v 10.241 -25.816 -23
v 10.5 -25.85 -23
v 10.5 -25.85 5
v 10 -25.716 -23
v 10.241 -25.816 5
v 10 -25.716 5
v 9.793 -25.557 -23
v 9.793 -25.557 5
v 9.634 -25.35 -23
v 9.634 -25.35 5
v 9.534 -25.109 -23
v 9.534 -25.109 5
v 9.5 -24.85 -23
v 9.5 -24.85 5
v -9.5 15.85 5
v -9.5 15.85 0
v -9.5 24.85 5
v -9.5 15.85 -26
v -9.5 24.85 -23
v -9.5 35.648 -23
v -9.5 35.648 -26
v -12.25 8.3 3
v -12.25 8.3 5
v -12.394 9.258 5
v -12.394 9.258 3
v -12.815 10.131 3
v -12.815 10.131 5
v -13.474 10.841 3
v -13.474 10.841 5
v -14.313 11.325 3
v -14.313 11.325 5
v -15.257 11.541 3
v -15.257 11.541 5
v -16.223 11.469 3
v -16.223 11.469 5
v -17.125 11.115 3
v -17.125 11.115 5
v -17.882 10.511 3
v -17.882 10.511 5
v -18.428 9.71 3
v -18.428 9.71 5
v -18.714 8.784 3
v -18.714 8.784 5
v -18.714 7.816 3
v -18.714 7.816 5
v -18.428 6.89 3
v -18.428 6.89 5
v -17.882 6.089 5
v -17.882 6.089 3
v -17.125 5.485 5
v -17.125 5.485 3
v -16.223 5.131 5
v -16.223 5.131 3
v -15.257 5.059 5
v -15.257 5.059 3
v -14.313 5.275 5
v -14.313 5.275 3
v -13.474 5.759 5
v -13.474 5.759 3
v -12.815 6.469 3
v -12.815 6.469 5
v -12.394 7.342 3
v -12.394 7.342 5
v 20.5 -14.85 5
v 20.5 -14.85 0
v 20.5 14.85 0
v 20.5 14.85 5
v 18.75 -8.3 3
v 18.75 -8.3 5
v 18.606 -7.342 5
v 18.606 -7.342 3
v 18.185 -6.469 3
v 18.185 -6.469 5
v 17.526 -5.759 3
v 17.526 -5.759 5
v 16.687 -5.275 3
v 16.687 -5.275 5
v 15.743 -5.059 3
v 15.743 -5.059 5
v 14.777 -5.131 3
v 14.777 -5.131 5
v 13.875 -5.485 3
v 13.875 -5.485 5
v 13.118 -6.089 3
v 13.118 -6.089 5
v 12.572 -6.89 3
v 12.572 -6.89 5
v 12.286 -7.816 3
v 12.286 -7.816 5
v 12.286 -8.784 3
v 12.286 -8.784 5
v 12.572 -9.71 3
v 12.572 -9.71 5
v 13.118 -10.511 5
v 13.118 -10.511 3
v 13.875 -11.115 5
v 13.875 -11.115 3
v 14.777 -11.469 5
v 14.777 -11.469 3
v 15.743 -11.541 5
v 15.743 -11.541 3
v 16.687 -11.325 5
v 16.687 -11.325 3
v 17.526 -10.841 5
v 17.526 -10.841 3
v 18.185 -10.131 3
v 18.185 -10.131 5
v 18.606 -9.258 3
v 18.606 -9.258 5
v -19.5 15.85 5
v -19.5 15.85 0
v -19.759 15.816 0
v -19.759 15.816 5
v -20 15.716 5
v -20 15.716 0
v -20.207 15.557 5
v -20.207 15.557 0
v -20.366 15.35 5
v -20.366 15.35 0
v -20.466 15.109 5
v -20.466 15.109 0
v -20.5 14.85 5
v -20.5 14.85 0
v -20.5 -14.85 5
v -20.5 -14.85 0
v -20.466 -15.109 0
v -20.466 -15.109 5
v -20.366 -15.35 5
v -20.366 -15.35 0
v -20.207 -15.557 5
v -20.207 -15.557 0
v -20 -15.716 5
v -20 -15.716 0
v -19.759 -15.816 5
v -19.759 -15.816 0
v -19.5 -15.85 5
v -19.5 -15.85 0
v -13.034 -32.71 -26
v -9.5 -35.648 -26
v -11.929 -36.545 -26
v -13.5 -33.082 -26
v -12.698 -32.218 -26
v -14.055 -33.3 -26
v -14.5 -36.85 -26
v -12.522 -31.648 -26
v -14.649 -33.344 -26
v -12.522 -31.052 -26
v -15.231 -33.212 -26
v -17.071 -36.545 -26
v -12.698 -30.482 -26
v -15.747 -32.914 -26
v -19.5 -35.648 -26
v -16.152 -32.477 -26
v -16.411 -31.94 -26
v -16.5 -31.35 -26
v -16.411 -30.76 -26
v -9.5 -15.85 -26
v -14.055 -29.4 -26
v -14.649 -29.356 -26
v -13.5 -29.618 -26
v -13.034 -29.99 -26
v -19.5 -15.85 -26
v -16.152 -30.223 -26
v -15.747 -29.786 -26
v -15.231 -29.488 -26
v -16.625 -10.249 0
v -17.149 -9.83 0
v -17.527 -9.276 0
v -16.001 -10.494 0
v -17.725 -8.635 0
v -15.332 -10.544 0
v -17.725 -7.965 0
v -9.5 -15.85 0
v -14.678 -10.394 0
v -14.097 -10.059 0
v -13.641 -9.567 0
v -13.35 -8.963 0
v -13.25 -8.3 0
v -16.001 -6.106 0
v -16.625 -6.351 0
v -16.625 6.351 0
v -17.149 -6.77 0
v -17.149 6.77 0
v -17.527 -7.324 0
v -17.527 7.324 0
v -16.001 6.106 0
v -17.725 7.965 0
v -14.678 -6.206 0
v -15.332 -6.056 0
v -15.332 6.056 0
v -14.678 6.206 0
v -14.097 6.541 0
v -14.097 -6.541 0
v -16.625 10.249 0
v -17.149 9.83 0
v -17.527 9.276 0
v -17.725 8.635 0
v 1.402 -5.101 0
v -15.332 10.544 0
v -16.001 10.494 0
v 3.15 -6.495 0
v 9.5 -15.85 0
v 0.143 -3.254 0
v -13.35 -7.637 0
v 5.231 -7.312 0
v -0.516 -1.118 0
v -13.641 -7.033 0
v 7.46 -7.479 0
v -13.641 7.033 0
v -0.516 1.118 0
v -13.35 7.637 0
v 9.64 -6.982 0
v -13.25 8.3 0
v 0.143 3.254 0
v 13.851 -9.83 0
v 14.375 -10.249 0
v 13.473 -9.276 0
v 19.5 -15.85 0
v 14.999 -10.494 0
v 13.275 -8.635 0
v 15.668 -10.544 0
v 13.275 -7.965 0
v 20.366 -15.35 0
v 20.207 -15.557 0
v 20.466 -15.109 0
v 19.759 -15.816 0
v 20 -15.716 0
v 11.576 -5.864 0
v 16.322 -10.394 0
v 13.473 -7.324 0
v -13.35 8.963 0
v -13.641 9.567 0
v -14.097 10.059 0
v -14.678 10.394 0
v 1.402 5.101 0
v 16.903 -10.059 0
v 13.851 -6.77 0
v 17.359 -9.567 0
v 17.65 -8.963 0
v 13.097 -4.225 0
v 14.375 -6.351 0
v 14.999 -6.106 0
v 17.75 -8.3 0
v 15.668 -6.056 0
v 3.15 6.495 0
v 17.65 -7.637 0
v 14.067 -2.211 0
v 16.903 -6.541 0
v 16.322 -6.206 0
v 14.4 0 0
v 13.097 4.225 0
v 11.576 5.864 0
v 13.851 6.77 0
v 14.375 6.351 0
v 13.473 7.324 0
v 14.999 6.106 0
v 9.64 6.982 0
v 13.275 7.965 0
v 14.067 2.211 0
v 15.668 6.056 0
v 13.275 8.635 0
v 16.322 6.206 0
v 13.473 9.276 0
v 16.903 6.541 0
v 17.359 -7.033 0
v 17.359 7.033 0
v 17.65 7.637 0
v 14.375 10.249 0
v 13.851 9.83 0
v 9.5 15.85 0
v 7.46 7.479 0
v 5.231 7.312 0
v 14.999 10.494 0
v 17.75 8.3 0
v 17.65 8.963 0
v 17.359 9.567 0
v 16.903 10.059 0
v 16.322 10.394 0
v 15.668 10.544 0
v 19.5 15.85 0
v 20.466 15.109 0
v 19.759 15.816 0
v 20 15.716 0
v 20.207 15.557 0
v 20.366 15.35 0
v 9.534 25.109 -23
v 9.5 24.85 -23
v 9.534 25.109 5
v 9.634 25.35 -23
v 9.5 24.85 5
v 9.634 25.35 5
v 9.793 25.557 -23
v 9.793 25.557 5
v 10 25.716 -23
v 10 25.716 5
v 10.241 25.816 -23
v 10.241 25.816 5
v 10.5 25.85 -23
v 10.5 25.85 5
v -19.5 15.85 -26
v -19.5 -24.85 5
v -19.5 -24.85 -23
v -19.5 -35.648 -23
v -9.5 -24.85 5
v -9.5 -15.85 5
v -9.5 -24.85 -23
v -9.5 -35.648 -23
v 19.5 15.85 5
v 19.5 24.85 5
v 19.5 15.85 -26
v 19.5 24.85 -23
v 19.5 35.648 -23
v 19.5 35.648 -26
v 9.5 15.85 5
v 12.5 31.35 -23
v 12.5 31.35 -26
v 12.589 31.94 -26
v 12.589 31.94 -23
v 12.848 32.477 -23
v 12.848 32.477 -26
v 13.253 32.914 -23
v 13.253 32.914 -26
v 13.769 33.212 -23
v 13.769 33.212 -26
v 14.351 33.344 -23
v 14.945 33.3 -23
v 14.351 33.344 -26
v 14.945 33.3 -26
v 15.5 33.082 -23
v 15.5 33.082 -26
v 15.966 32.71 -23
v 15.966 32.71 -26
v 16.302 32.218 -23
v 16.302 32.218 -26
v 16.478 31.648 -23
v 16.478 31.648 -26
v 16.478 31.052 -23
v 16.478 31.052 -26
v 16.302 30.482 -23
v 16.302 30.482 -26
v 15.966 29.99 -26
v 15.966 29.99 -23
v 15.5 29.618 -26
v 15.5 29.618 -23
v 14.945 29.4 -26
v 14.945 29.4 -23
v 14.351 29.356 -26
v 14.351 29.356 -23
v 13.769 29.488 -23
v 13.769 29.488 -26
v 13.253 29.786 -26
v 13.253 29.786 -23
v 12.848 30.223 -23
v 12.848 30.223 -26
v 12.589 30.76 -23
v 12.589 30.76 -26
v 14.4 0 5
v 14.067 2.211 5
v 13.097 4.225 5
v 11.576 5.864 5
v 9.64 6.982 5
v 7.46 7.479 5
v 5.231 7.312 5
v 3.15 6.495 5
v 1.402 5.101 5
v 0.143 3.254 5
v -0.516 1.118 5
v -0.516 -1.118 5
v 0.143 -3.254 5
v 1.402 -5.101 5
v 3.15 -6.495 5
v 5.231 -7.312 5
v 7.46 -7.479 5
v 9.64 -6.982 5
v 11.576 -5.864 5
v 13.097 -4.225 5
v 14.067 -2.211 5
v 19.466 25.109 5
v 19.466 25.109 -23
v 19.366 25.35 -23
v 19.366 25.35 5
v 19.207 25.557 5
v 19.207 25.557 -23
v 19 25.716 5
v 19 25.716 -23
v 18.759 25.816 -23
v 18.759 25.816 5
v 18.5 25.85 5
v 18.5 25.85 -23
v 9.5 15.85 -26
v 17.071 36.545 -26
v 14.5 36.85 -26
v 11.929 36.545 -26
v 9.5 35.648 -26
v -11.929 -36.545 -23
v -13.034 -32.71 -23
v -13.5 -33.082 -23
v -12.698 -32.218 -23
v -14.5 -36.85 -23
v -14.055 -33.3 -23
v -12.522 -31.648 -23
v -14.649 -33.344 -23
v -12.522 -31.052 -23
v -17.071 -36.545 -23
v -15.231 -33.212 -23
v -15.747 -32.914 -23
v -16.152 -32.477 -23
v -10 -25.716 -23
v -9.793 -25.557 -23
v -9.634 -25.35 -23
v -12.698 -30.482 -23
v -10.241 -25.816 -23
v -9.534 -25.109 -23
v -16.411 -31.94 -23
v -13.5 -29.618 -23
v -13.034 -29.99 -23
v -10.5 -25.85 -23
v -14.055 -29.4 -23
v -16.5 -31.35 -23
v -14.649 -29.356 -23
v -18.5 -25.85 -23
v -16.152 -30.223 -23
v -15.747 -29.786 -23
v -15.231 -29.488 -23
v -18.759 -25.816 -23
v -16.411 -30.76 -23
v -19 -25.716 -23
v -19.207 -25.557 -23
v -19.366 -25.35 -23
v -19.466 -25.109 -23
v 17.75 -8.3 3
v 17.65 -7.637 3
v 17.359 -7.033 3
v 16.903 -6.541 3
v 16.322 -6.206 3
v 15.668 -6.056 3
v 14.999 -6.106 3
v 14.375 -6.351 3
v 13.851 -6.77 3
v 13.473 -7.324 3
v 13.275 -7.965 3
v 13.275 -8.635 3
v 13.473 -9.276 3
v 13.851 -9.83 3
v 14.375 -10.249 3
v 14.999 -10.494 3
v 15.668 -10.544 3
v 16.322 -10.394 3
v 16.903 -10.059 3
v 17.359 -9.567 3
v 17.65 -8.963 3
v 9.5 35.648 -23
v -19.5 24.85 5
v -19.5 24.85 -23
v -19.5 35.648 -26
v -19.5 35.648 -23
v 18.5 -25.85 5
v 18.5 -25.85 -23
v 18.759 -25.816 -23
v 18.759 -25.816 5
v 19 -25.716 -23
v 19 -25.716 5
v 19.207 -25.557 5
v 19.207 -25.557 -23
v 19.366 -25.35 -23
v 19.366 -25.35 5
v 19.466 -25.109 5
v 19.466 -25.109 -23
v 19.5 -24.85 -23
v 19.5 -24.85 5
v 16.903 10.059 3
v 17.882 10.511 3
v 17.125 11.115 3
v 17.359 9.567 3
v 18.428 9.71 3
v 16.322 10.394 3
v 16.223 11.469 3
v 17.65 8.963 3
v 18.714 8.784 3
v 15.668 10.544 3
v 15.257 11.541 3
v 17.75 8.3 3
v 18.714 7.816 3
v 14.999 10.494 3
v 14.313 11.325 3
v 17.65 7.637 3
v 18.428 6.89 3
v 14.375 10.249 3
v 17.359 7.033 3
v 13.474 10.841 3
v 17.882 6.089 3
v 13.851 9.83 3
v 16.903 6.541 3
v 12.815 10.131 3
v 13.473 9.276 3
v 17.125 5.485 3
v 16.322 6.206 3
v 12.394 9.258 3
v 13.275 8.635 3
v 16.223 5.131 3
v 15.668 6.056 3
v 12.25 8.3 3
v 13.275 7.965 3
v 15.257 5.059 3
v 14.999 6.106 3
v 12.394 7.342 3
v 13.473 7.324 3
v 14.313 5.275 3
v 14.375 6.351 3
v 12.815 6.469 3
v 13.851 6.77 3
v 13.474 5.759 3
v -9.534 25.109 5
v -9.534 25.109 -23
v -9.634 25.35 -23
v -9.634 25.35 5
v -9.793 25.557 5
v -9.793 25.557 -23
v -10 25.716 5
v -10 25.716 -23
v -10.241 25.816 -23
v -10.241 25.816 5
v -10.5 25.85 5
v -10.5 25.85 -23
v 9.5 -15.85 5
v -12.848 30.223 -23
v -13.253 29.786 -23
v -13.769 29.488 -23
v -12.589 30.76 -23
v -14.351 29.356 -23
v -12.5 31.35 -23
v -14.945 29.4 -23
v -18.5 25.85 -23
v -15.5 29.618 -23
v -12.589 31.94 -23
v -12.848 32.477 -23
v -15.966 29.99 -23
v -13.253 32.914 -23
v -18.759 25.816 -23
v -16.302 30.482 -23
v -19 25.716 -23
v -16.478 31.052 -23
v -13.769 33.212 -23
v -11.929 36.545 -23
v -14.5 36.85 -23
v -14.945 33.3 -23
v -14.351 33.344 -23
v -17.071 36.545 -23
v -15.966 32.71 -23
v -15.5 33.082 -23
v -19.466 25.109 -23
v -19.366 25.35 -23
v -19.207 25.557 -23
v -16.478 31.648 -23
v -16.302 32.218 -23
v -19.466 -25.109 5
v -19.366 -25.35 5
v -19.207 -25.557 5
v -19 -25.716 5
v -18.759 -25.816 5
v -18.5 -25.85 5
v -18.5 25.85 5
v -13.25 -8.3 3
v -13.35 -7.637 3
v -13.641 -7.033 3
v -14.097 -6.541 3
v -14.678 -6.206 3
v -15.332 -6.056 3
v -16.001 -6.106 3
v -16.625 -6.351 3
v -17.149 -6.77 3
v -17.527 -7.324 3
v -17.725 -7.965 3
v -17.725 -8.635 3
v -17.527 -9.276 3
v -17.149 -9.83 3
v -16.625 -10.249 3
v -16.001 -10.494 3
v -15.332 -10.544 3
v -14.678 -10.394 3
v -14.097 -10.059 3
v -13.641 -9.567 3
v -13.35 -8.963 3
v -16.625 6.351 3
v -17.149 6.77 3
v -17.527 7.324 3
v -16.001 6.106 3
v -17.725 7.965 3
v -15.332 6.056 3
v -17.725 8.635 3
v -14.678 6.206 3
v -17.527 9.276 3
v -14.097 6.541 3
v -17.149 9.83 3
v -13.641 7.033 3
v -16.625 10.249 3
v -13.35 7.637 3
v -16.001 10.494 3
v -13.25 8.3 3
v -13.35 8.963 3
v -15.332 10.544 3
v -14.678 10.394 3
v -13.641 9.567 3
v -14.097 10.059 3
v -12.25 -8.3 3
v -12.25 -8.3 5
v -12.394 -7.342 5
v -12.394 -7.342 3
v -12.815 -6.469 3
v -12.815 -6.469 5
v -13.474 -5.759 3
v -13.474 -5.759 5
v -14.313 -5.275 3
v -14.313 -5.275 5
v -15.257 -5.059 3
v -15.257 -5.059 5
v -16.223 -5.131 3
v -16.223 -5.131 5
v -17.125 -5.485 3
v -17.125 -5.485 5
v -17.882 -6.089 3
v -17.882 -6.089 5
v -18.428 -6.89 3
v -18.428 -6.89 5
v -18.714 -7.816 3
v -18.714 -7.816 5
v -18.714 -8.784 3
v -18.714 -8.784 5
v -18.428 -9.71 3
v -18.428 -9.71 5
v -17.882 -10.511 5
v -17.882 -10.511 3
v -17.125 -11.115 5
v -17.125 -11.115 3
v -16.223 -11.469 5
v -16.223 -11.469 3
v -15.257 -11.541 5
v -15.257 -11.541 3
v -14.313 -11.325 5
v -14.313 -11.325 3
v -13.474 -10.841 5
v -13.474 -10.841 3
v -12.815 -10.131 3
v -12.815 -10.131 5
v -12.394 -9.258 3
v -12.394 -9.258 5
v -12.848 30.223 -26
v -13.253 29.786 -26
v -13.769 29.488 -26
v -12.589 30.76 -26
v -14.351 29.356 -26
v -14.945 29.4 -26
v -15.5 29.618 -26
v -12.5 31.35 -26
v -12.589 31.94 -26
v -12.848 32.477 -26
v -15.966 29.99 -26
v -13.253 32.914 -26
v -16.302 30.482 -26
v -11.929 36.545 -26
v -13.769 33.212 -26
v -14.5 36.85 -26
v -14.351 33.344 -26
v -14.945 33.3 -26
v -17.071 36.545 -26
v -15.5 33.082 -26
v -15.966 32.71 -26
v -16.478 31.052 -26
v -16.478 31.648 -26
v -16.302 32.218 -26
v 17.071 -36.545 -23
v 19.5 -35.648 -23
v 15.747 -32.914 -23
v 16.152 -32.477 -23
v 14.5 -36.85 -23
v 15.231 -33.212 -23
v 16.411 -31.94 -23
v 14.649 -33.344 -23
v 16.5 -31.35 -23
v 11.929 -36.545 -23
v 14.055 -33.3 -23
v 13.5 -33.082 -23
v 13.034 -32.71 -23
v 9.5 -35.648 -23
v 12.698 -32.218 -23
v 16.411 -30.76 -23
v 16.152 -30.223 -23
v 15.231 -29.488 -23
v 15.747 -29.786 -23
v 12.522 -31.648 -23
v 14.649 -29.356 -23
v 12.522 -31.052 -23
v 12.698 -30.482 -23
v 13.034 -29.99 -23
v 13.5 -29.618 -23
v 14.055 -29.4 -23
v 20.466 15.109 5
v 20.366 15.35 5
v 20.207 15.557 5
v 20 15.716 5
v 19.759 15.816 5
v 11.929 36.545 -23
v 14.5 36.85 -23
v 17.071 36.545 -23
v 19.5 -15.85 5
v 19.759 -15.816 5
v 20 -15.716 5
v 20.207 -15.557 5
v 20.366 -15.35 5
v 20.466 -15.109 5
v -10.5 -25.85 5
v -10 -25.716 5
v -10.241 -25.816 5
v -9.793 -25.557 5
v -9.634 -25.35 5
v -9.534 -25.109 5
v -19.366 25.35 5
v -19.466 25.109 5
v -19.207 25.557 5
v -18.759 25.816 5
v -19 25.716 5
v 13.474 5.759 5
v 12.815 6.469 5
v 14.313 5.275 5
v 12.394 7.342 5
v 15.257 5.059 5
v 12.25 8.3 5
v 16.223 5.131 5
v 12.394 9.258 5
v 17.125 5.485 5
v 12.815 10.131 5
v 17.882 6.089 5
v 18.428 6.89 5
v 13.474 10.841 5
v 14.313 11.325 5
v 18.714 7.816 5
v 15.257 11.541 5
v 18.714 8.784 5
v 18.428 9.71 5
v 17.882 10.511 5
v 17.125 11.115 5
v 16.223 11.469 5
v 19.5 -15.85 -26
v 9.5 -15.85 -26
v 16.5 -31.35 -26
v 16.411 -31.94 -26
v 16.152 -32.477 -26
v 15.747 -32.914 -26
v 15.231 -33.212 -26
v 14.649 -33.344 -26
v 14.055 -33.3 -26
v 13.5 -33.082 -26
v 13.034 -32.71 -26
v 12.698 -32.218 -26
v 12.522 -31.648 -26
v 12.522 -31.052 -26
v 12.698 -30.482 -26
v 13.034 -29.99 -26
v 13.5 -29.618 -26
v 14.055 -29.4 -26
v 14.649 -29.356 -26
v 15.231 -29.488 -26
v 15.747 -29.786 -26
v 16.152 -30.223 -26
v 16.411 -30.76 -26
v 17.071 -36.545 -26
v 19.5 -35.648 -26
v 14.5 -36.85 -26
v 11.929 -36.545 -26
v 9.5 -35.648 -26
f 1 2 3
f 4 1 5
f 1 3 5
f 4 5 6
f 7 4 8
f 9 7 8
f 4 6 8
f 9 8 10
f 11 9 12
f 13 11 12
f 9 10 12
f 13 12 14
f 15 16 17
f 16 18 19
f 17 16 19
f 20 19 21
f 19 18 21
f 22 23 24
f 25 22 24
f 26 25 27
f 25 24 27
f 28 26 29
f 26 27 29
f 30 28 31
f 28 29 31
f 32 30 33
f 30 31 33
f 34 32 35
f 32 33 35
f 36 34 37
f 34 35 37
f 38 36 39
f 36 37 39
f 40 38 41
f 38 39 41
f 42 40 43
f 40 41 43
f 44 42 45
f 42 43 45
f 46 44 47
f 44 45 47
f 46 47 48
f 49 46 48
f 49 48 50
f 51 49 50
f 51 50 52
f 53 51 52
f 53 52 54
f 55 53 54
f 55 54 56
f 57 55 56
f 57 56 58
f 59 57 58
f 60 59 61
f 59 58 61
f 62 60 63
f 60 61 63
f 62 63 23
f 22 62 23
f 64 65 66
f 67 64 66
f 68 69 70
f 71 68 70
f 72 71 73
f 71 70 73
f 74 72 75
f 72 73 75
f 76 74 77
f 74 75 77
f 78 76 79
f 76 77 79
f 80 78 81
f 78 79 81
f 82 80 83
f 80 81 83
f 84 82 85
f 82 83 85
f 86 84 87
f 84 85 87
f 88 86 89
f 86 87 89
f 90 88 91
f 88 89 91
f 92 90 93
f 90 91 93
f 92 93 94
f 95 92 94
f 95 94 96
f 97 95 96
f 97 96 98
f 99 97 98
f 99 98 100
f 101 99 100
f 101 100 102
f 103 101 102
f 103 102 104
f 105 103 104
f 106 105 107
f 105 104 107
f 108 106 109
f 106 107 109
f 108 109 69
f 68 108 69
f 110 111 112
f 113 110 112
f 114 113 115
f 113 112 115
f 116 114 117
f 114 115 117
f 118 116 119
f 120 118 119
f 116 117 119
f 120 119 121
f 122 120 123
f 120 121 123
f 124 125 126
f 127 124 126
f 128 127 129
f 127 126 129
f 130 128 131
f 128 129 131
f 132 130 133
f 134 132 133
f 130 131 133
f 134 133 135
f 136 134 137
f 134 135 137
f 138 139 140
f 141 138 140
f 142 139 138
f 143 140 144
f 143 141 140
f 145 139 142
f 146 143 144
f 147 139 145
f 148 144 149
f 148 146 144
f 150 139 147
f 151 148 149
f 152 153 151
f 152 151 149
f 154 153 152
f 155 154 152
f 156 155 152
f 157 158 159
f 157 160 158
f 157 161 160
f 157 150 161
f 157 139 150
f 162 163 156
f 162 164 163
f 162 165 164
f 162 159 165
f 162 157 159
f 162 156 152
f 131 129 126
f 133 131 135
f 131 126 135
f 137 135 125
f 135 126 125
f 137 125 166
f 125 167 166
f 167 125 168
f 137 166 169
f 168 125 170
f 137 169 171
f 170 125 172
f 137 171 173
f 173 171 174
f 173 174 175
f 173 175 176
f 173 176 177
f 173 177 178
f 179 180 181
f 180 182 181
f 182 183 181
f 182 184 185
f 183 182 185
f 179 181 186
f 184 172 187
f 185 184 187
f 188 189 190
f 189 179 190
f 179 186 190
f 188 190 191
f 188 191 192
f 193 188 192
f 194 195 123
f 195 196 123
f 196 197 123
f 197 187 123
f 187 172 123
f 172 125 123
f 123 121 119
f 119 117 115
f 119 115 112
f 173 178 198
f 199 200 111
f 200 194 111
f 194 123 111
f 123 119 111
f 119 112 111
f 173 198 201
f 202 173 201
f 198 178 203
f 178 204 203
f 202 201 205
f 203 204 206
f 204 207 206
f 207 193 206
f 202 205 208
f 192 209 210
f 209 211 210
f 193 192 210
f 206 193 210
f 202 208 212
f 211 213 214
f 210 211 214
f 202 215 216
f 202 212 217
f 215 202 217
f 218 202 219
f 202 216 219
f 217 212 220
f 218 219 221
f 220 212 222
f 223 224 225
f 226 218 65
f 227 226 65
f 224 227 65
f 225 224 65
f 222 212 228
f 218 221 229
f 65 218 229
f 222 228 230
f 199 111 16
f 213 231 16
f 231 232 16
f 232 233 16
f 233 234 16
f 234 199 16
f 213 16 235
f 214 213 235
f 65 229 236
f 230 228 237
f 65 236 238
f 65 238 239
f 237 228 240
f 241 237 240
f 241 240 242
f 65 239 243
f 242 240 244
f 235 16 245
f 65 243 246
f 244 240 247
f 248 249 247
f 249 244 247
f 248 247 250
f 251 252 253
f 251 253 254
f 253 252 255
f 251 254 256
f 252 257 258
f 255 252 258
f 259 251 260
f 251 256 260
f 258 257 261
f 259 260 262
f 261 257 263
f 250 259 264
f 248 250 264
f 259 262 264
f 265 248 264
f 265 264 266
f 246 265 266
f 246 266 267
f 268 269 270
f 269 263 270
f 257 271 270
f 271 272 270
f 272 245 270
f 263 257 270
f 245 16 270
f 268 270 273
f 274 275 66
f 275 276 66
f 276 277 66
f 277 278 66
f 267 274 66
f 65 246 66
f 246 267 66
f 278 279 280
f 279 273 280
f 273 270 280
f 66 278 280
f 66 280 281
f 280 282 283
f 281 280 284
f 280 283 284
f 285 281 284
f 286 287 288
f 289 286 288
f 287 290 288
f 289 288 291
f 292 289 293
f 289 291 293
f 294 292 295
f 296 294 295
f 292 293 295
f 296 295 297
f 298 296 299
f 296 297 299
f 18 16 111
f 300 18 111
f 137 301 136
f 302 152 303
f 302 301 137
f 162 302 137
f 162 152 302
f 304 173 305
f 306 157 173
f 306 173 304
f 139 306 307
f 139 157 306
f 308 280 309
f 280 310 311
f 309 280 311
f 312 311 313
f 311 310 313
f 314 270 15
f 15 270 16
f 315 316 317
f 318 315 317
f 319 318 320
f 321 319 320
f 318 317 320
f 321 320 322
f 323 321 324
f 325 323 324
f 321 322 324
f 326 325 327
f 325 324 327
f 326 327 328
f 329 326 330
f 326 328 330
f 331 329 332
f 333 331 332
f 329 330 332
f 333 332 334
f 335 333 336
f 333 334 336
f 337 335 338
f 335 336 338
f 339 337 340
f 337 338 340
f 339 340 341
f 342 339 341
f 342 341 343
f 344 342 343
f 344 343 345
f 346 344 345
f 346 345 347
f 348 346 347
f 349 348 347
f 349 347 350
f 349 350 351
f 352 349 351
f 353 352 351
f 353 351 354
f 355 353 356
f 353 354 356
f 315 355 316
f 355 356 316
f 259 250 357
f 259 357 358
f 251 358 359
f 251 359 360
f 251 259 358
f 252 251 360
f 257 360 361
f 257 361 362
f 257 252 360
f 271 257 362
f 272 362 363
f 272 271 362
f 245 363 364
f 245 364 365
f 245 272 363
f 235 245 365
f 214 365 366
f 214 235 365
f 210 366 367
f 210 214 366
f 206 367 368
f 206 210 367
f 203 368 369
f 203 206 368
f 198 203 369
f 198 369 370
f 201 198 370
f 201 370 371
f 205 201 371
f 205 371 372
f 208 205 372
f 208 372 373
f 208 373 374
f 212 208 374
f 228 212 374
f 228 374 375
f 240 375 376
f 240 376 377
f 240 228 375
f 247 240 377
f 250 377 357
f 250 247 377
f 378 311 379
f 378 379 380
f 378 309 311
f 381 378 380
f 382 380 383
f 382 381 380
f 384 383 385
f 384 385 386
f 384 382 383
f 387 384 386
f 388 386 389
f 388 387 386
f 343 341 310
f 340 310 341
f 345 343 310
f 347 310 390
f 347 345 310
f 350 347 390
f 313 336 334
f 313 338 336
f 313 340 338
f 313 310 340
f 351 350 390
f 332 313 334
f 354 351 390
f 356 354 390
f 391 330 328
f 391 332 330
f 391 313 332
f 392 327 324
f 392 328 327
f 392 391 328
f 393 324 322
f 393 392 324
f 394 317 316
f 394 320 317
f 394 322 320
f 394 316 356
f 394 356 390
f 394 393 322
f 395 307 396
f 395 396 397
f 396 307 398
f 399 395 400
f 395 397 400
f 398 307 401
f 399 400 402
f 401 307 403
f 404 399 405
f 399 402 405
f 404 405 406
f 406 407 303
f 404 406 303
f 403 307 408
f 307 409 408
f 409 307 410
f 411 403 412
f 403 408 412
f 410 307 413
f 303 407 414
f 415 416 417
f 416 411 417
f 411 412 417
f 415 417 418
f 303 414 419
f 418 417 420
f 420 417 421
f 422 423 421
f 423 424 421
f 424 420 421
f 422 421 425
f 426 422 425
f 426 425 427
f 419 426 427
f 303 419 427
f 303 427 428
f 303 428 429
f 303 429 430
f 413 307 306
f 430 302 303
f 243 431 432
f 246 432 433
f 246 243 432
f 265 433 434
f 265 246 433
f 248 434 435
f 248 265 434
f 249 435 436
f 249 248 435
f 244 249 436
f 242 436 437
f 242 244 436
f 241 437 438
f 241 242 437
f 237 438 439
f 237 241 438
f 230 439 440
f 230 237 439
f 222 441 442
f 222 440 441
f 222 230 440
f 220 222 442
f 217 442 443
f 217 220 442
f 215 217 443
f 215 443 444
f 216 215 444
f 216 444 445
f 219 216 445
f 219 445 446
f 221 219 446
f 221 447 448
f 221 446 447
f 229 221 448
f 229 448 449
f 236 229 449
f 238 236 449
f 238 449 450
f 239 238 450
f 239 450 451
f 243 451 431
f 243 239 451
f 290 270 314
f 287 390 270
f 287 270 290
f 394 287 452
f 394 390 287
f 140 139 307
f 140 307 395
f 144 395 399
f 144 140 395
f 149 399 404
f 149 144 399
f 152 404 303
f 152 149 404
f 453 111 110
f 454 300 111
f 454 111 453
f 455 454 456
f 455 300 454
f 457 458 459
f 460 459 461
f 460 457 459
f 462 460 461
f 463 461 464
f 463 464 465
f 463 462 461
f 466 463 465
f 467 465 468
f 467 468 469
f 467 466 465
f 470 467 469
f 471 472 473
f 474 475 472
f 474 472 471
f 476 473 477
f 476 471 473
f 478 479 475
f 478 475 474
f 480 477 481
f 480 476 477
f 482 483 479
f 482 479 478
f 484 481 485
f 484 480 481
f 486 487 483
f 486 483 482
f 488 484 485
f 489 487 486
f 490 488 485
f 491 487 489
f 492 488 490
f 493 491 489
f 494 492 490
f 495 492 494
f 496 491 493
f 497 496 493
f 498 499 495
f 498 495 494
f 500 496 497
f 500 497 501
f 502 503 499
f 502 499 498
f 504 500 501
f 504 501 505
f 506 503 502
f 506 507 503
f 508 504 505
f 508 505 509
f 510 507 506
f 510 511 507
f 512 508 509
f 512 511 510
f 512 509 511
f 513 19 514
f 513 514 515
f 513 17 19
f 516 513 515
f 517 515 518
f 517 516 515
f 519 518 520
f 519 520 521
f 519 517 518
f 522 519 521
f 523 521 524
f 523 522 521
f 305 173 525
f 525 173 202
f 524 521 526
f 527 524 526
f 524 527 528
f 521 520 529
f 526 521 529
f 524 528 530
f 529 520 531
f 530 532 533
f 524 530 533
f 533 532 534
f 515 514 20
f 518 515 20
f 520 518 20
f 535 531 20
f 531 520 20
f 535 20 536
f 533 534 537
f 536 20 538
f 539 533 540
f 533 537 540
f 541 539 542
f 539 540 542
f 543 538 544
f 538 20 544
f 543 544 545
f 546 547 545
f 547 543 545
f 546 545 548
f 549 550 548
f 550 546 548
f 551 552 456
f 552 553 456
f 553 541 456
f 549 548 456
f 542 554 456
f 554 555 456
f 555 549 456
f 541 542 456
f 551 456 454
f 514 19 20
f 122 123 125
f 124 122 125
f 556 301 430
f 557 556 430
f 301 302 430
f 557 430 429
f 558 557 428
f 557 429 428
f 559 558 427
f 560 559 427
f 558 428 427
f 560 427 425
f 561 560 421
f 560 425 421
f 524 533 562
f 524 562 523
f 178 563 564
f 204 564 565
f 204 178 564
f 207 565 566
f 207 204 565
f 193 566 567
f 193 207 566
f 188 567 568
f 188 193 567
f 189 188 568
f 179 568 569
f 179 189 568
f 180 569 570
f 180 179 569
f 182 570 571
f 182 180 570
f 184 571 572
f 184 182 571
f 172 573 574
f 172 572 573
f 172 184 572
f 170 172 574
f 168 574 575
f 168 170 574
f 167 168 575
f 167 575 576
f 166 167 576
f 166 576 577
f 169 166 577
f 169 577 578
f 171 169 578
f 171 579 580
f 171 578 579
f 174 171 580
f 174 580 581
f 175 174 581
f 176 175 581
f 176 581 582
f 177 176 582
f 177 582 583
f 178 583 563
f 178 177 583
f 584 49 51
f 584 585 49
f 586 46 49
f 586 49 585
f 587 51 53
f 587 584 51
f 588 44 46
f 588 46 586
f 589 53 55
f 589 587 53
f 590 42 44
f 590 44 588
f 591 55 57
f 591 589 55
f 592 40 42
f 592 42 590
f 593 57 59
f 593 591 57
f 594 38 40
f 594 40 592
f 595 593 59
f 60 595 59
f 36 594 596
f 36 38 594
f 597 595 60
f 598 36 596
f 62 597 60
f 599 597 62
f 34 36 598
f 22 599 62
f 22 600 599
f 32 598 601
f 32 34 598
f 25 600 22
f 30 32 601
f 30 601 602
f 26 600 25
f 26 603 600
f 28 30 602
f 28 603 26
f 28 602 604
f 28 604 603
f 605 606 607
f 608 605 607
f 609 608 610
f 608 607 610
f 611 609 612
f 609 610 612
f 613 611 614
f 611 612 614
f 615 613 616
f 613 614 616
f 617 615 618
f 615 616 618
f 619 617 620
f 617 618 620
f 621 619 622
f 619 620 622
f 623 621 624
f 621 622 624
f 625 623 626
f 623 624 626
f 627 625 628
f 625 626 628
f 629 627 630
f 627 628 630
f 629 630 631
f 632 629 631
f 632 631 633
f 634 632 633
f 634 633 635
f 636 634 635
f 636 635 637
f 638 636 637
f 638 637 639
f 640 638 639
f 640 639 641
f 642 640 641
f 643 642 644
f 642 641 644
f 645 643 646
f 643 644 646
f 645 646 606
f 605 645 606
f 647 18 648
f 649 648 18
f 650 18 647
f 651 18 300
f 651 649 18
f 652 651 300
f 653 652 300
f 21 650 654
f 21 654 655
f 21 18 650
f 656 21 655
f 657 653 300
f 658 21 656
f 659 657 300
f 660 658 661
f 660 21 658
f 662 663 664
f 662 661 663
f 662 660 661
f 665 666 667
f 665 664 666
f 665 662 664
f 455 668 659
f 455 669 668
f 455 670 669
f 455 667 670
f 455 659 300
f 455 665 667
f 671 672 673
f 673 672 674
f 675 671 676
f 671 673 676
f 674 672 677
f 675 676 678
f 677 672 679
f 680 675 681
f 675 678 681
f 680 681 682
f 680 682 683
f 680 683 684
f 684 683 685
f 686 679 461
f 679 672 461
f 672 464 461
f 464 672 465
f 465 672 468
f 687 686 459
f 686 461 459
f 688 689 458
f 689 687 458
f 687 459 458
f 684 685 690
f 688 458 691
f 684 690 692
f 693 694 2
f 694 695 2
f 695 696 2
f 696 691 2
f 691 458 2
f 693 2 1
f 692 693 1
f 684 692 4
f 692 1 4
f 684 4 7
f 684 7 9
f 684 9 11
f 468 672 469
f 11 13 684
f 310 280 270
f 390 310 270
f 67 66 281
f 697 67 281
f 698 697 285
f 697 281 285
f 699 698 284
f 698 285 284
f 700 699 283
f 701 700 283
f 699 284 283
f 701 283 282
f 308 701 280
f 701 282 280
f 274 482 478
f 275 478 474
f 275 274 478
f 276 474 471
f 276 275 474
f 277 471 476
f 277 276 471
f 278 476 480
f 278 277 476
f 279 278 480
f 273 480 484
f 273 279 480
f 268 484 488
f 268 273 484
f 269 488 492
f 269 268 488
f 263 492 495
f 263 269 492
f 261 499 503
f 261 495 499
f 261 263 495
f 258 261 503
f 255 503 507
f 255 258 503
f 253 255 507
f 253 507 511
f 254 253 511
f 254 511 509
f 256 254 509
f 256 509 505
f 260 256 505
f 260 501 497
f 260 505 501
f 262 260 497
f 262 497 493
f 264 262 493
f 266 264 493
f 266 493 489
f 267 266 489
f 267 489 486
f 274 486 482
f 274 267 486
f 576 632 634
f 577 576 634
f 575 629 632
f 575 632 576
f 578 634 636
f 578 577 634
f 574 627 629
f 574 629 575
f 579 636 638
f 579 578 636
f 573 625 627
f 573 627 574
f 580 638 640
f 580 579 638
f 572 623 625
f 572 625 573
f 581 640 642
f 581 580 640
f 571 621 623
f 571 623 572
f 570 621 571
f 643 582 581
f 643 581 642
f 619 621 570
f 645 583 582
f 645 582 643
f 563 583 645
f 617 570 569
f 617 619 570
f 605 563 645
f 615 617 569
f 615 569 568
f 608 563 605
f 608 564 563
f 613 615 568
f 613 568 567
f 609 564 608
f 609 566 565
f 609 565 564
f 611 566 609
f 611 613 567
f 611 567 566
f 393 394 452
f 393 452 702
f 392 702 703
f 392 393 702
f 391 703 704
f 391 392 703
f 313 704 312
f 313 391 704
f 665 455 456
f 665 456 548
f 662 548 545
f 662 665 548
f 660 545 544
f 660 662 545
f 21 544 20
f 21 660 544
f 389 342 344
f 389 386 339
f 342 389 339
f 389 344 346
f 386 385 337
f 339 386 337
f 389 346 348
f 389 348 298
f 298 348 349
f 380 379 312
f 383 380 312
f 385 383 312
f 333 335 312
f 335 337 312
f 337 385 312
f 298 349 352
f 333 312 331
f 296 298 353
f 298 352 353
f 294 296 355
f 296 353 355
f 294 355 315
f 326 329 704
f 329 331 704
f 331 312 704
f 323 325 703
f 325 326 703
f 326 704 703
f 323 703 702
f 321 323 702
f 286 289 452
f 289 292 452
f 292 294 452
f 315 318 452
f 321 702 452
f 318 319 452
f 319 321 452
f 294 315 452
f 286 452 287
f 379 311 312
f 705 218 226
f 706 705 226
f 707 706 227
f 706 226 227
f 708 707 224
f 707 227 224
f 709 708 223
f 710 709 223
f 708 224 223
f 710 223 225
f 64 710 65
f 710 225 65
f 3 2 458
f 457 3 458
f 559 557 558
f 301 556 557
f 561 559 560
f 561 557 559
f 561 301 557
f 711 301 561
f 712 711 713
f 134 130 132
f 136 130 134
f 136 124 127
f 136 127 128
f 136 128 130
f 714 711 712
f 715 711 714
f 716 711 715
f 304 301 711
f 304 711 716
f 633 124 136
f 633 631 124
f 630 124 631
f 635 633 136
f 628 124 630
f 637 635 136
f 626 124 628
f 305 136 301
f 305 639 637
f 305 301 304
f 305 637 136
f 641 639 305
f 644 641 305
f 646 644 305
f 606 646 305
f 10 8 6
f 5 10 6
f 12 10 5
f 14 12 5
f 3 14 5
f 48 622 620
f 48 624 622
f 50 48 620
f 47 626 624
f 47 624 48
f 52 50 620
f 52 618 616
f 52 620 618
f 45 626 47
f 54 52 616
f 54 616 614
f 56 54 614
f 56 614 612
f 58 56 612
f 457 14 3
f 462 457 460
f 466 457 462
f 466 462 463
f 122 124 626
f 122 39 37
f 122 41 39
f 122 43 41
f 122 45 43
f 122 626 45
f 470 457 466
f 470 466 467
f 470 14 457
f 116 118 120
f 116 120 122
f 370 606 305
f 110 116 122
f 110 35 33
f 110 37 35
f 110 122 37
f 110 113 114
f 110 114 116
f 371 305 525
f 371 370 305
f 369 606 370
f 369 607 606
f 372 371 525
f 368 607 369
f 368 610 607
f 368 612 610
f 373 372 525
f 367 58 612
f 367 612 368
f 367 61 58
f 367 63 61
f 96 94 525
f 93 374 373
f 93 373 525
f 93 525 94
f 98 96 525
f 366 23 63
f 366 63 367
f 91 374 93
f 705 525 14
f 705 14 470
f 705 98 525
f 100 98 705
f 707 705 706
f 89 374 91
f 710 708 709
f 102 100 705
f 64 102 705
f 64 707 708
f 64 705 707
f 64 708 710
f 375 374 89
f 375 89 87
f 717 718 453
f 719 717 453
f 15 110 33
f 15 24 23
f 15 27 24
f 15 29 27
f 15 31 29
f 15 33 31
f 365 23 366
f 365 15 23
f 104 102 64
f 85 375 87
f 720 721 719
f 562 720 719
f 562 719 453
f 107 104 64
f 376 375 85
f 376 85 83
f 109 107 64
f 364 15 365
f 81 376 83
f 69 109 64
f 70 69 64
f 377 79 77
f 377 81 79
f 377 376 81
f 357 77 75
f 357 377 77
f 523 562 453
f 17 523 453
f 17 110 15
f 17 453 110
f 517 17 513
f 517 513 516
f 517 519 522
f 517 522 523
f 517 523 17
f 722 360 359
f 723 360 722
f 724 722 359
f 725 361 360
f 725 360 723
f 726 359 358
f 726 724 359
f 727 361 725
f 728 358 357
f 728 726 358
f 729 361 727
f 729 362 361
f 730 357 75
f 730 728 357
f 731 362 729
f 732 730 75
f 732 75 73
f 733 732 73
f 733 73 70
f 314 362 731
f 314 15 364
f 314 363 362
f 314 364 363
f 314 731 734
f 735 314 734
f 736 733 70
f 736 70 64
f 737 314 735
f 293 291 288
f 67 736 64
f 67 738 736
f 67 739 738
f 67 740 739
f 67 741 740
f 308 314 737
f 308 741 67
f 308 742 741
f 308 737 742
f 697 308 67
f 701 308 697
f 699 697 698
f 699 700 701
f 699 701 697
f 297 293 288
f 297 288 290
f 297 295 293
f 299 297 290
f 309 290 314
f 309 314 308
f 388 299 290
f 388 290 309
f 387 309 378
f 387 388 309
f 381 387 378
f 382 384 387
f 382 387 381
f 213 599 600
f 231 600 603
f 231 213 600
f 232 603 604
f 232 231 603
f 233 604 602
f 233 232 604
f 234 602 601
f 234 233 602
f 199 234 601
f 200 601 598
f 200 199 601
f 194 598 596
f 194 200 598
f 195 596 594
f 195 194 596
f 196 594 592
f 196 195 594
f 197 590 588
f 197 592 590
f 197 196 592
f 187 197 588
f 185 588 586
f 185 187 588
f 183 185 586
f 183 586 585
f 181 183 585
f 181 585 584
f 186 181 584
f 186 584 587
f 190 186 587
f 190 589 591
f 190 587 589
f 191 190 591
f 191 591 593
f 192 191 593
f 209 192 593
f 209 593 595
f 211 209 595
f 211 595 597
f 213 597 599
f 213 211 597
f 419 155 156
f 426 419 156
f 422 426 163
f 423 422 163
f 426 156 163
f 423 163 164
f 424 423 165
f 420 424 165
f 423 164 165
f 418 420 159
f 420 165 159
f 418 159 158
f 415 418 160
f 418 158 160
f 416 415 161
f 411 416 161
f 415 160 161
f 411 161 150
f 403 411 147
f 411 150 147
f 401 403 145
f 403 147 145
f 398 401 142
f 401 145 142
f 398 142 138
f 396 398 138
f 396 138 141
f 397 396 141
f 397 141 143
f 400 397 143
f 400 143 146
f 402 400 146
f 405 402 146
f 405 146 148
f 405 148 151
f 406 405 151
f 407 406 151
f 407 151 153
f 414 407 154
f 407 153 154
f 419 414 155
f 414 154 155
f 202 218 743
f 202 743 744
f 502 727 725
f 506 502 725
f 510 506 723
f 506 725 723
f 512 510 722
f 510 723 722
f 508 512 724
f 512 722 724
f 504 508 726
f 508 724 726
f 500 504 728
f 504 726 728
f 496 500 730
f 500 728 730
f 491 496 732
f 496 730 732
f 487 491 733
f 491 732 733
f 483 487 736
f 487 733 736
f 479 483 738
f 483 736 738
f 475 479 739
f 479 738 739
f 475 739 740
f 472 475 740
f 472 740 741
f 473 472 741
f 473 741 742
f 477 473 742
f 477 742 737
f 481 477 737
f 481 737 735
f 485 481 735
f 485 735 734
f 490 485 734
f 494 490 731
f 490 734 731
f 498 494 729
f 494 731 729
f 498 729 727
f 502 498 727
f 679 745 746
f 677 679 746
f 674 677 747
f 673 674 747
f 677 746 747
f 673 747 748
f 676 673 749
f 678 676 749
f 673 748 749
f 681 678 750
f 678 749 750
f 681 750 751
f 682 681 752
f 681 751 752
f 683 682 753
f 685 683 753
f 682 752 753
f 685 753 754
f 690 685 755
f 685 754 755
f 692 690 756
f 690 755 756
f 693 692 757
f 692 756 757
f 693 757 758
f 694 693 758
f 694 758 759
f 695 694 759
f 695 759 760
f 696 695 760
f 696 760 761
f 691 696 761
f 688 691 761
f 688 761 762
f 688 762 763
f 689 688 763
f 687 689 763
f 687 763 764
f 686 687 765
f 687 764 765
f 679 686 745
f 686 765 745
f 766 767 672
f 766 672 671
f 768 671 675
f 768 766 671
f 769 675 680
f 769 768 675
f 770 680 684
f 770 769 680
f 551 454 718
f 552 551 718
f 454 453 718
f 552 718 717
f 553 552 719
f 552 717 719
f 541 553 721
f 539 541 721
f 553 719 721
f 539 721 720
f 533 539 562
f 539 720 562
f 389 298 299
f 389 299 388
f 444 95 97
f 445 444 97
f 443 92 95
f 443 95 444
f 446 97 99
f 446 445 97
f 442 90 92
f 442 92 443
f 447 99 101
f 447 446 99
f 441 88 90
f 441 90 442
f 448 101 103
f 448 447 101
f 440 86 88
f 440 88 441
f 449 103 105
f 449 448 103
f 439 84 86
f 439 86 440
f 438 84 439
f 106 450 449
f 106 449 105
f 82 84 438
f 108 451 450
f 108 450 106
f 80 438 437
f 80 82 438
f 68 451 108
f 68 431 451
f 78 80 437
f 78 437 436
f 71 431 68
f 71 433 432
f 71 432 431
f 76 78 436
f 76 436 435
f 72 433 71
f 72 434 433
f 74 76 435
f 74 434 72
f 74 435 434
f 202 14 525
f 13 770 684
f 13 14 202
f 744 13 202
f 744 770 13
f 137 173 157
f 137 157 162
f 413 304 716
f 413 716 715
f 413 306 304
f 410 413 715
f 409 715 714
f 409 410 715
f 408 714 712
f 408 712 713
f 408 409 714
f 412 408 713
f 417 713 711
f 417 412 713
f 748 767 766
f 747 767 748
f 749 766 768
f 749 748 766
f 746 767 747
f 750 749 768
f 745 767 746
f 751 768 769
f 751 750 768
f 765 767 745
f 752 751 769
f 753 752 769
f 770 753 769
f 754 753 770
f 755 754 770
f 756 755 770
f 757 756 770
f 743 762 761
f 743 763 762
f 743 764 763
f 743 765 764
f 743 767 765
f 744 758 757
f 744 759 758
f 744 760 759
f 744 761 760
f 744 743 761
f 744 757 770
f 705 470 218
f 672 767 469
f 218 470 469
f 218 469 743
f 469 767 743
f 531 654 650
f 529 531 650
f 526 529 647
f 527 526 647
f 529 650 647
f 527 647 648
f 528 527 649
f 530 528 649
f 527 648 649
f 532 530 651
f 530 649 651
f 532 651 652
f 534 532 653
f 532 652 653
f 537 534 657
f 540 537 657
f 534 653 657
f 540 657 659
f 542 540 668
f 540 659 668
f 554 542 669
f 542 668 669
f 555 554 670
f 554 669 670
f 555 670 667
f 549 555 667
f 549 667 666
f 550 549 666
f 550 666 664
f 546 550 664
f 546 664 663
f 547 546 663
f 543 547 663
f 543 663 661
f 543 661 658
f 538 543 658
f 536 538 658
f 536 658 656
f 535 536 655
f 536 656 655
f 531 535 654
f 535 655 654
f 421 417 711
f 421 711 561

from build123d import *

# Parameters (mm, degrees)
SKETCH1_W           = 10
SKETCH1_H           = 10
SKETCH1_R           = 7.5
SKETCH1_R_2         = 2.25
BOSS_EXTRUDE1_DEPTH = 5
SKETCH2_W           = 10
SKETCH2_H           = 10
BOSS_EXTRUDE2_DEPTH = 26
SKETCH4_R           = 2
BOSS_EXTRUDE3_DEPTH = 3
FILLET1_R           = 1
SKETCH5_R           = 3.25
CUT_EXTRUDE1_DEPTH  = 2


with BuildPart() as part:
    # Sketch1 → Boss-Extrude1 (new body)
    # profile 1 of 5: a face of its own
    with BuildSketch(Plane.XY):
        with Locations((-14.5, 20.85)):
            Rectangle(SKETCH1_W, SKETCH1_H)
    # profile 2 of 5: a face of its own
    with BuildSketch(Plane.XY):
        with Locations((14.5, 20.85)):
            Rectangle(SKETCH1_W, SKETCH1_H)
    # profile 3 of 5: a face of its own
    with BuildSketch(Plane.XY):
        with BuildLine():
            Line((-20.5, -1.457145002), (-20.5, -14.85))
            ThreePointArc((-20.5, -14.85), (-20.207106781, -15.557106781), (-19.5, -15.85))
            Line((-19.5, -15.85), (19.5, -15.85))
            ThreePointArc((19.5, -15.85), (20.207106781, -15.557106781), (20.5, -14.85))
            Line((20.5, -14.85), (20.5, 14.85))
            ThreePointArc((20.5, 14.85), (20.207106781, 15.557106781), (19.5, 15.85))
            Line((19.5, 15.85), (-19.5, 15.85))
            ThreePointArc((-19.5, 15.85), (-20.207106781, 15.557106781), (-20.5, 14.85))
            Line((-20.5, 14.85), (-20.5, -1.457145002))
        make_face()
        with Locations((6.9, 0)):
            Circle(SKETCH1_R, mode=Mode.SUBTRACT)
        with Locations((15.5, 8.3)):
            Circle(SKETCH1_R_2, mode=Mode.SUBTRACT)
        with Locations((15.5, -8.3)):
            Circle(SKETCH1_R_2, mode=Mode.SUBTRACT)
        with Locations((-15.5, -8.3)):
            Circle(SKETCH1_R_2, mode=Mode.SUBTRACT)
        with Locations((-15.5, 8.3)):
            Circle(SKETCH1_R_2, mode=Mode.SUBTRACT)
    # profile 4 of 5: a face of its own
    with BuildSketch(Plane.XY):
        with Locations((14.5, -20.85)):
            Rectangle(SKETCH1_W, SKETCH1_H)
    # profile 5 of 5: a face of its own
    with BuildSketch(Plane.XY):
        with Locations((-14.5, -20.85)):
            Rectangle(SKETCH1_W, SKETCH1_H)
    extrude(amount=BOSS_EXTRUDE1_DEPTH)

    # Sketch2 → Boss-Extrude2 (add)
    with BuildSketch(Plane(origin=(0, 0, 0), x_dir=(-1, 0, 0), z_dir=(0, 0, -1))):
        with Locations((14.5, -20.85)):
            Rectangle(SKETCH2_W, SKETCH2_H)
        with Locations((-14.5, -20.85)):
            Rectangle(SKETCH2_W, SKETCH2_H)
        with Locations((14.5, 20.85)):
            Rectangle(SKETCH2_W, SKETCH2_H)
        with Locations((-14.5, 20.85)):
            Rectangle(SKETCH2_W, SKETCH2_H)
    extrude(amount=BOSS_EXTRUDE2_DEPTH)

    # Sketch4 → Boss-Extrude3 (add)
    # profile 1 of 4: a face of its own
    with BuildSketch(Plane(origin=(0, 0, -26), x_dir=(-1, 0, 0), z_dir=(0, 0, -1))):
        with BuildLine():
            Line((9.5, -25.85), (9.5, -35.647958971))
            ThreePointArc((9.5, -35.647958971), (14.5, -36.85), (19.5, -35.647958971))
            Line((19.5, -35.647958971), (19.5, -25.85))
            Line((19.5, -25.85), (9.5, -25.85))
        make_face()
        with Locations((14.5, -31.35)):
            Circle(SKETCH4_R, mode=Mode.SUBTRACT)
    # profile 2 of 4: a face of its own
    with BuildSketch(Plane(origin=(0, 0, -26), x_dir=(-1, 0, 0), z_dir=(0, 0, -1))):
        with BuildLine():
            Line((-19.5, -25.85), (-19.5, -35.647958971))
            ThreePointArc((-19.5, -35.647958971), (-14.5, -36.85), (-9.5, -35.647958971))
            Line((-9.5, -35.647958971), (-9.5, -25.85))
            Line((-9.5, -25.85), (-19.5, -25.85))
        make_face()
        with Locations(Location((-14.5, -31.35, 0), (0, 0, 180))):
            Circle(SKETCH4_R, mode=Mode.SUBTRACT)
    # profile 3 of 4: a face of its own
    with BuildSketch(Plane(origin=(0, 0, -26), x_dir=(-1, 0, 0), z_dir=(0, 0, -1))):
        with BuildLine():
            Line((19.5, 25.85), (19.5, 35.647958971))
            ThreePointArc((19.5, 35.647958971), (14.5, 36.85), (9.5, 35.647958971))
            Line((9.5, 35.647958971), (9.5, 25.85))
            Line((9.5, 25.85), (19.5, 25.85))
        make_face()
        with Locations(Location((14.5, 31.35, 0), (0, 0, 180))):
            Circle(SKETCH4_R, mode=Mode.SUBTRACT)
    # profile 4 of 4: a face of its own
    with BuildSketch(Plane(origin=(0, 0, -26), x_dir=(-1, 0, 0), z_dir=(0, 0, -1))):
        with BuildLine():
            Line((-9.5, 25.85), (-9.5, 35.647958971))
            ThreePointArc((-9.5, 35.647958971), (-14.5, 36.85), (-19.5, 35.647958971))
            Line((-19.5, 35.647958971), (-19.5, 25.85))
            Line((-19.5, 25.85), (-9.5, 25.85))
        make_face()
        with Locations((-14.5, 31.35)):
            Circle(SKETCH4_R, mode=Mode.SUBTRACT)
    extrude(amount=-BOSS_EXTRUDE3_DEPTH)

    # Fillet1
    fillet1_edges = [part.edges().sort_by_distance(p)[0] for p in [
        (9.5, 25.85, -9),
        (19.5, 25.85, -9),
        (19.5, -25.85, -9),
        (9.5, -25.85, -9),
        (-9.5, -25.85, -9),
        (-19.5, -25.85, -9),
        (-19.5, 25.85, -9),
        (-9.5, 25.85, -9),
    ]]
    fillet(fillet1_edges, radius=FILLET1_R)

    # Sketch5 → Cut-Extrude1 (cut)
    with BuildSketch(Plane.XY.offset(5)):
        with Locations((-15.5, -8.3)):
            Circle(SKETCH5_R)
        with Locations((-15.5, 8.3)):
            Circle(SKETCH5_R)
        with Locations((15.5, -8.3)):
            Circle(SKETCH5_R)
        with Locations(Location((15.5, 8.3, 0), (0, 0, 180))):
            Circle(SKETCH5_R)
    extrude(amount=-CUT_EXTRUDE1_DEPTH, mode=Mode.SUBTRACT)


solid = part.part
